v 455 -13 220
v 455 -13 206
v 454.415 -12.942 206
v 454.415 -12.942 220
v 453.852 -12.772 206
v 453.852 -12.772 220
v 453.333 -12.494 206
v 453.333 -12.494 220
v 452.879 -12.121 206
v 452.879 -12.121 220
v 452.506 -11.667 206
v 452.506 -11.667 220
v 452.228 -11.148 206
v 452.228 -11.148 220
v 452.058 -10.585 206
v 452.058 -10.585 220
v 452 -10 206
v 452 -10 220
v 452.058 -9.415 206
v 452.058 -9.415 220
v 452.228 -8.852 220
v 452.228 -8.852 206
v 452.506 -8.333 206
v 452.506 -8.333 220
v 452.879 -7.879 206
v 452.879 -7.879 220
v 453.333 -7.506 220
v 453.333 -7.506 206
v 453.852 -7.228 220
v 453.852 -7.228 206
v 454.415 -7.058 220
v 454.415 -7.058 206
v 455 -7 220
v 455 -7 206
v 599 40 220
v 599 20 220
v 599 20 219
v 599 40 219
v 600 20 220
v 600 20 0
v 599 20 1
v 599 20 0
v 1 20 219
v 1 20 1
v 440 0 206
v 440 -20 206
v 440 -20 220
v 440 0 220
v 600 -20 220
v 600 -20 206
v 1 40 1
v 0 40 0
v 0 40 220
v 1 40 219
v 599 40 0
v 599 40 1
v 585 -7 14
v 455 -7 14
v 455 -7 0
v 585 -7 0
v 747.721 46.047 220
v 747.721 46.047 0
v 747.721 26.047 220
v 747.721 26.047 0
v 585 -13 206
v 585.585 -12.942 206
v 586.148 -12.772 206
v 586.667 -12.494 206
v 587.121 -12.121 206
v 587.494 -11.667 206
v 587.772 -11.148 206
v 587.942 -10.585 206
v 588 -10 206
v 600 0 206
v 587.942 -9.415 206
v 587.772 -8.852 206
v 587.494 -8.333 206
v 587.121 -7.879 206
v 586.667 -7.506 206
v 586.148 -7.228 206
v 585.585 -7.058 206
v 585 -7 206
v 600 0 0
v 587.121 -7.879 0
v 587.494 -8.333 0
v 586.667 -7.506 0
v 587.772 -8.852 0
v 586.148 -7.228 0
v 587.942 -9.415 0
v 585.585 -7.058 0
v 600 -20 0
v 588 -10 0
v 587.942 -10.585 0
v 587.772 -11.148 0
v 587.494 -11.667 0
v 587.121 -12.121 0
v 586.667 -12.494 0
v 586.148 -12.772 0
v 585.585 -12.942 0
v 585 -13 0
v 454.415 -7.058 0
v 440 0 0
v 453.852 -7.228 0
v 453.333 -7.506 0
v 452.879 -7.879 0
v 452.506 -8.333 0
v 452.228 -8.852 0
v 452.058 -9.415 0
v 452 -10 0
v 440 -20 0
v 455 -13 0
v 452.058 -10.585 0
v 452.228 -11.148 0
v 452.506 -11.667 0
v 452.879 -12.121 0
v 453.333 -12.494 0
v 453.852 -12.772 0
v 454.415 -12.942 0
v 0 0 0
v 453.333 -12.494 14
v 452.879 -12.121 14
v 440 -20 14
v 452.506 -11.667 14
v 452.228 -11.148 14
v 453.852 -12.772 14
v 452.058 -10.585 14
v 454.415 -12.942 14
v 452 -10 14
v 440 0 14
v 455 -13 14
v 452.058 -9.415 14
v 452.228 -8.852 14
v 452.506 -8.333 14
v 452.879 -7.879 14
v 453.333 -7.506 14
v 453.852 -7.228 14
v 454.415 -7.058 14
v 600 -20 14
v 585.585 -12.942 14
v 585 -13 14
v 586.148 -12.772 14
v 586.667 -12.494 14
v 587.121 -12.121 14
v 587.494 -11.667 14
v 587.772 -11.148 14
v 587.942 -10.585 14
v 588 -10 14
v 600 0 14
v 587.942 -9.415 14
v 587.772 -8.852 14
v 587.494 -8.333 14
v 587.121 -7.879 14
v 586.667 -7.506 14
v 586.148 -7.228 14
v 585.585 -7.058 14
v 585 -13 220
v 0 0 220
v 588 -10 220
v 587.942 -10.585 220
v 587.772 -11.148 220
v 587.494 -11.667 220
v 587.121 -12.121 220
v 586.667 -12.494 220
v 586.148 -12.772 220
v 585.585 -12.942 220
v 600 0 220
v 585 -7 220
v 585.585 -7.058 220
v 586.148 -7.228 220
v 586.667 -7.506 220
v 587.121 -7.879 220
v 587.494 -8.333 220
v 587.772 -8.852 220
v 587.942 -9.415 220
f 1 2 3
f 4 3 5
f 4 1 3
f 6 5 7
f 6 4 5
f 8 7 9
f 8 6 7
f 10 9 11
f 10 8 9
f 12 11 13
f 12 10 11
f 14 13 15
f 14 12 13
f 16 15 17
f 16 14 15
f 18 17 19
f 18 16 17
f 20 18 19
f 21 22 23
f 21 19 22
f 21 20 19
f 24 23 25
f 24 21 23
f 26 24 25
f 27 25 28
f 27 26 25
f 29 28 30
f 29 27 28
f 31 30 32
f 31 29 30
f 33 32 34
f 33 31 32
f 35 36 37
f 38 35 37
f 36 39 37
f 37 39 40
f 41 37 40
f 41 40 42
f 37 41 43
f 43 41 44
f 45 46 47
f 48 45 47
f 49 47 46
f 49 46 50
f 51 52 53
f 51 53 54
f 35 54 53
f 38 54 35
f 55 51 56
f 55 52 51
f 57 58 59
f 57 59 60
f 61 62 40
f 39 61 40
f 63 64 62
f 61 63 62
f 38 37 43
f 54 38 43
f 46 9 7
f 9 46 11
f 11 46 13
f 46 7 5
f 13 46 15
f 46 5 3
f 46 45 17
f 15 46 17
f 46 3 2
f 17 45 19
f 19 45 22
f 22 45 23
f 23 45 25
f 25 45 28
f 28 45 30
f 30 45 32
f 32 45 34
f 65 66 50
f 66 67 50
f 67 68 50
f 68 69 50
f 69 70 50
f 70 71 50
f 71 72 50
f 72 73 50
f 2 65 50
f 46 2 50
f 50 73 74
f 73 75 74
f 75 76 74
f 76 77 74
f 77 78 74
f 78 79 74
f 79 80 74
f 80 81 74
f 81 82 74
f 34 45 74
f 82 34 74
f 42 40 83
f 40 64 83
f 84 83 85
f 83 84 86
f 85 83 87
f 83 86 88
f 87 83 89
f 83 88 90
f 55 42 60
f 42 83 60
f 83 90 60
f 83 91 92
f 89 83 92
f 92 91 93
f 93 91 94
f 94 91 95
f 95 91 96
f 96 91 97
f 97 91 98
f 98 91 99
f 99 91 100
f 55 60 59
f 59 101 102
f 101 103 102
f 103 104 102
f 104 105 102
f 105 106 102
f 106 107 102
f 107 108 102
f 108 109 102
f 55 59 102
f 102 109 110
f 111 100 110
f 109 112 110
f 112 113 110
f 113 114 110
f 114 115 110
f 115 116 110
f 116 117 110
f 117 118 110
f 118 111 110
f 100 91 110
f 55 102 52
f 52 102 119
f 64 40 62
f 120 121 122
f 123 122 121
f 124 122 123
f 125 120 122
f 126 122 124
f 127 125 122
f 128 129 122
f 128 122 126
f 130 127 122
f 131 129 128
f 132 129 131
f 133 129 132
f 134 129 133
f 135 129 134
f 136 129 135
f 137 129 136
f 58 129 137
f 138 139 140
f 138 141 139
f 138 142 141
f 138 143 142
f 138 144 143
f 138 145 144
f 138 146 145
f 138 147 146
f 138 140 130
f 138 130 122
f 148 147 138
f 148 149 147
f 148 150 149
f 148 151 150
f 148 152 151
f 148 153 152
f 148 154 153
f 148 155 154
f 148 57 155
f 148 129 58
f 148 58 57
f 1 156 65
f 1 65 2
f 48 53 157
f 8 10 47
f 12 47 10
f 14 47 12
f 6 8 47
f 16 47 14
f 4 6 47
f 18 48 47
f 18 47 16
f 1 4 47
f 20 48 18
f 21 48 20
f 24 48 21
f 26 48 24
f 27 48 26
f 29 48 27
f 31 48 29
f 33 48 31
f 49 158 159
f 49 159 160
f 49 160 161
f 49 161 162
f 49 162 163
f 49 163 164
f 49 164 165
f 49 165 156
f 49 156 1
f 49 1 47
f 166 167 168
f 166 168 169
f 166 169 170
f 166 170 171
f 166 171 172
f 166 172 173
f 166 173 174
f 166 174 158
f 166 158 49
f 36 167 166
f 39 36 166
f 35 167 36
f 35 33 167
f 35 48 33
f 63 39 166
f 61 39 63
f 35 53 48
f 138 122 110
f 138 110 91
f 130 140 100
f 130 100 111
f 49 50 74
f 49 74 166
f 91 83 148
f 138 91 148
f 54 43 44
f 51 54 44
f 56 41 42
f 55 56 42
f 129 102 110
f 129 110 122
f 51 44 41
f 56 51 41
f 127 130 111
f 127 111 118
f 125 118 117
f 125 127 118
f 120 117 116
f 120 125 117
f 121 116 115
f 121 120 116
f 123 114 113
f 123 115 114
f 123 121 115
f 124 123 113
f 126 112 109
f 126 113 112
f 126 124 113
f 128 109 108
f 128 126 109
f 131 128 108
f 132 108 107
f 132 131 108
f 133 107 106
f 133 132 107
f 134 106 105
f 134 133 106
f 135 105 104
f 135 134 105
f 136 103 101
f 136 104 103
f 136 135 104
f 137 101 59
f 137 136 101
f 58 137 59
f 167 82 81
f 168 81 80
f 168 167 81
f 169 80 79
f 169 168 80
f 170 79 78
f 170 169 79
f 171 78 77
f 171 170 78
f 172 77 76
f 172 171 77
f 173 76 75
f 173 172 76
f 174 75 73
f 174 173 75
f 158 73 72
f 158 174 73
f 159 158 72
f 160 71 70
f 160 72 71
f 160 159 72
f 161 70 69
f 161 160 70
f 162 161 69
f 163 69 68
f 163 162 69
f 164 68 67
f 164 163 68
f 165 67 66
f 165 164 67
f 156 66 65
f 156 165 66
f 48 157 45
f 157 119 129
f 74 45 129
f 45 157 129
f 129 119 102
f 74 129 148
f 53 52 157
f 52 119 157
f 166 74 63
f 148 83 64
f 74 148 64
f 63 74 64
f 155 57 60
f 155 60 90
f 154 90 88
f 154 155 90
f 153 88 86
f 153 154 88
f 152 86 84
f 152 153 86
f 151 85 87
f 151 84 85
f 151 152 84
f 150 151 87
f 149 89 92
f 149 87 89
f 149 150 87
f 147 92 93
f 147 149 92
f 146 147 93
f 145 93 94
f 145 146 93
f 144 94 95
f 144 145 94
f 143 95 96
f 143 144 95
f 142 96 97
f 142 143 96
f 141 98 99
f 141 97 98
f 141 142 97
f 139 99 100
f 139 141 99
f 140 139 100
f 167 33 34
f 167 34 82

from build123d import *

# Parameters (mm, degrees)
DODANIE_WYCI_GNI_CIE1_DEPTH = 220
DODANIE_WYCI_GNI_CIE2_DEPTH = 20
SZKIC3_W                    = 160
SZKIC3_H                    = 14
DODANIE_WYCI_GNI_CIE3_DEPTH = 20
WYTNIJ_WYCI_GNI_CIE1_DEPTH  = 781.773516846


with BuildPart() as part:
    # Szkic1 → Dodanie-wyciągnięcie1 (new body)
    with BuildSketch(Plane.XY):
        Polygon((600, 0), (747.721162952, 26.04722665), (747.721162952, 46.04722665), (600, 20), (0, 20), (0, 0), align=None)
    extrude(amount=DODANIE_WYCI_GNI_CIE1_DEPTH)

    # Szkic2 → Dodanie-wyciągnięcie2 (add)
    with BuildSketch(Plane(origin=(0, 20, 0), x_dir=(1, 0, 0), z_dir=(0, 1, 0))):
        Polygon((1, -1), (599, -1), (599, 0), (0, 0), (0, -220), (599, -220), (599, -219), (1, -219), align=None)
    extrude(amount=DODANIE_WYCI_GNI_CIE2_DEPTH)

    # Szkic3 → Dodanie-wyciągnięcie3 (add)
    with BuildSketch(Plane.XZ):
        with Locations((520, 213)):
            Rectangle(SZKIC3_W, SZKIC3_H)
        with Locations((520, 7)):
            Rectangle(SZKIC3_W, SZKIC3_H)
    extrude(amount=DODANIE_WYCI_GNI_CIE3_DEPTH)

    # Szkic4 → Wytnij-wyciągnięcie1 (cut, through all)
    with BuildSketch(Plane.XY.offset(220)):
        with BuildLine():
            Line((585, -13), (455, -13))
            ThreePointArc((455, -13), (452, -10), (455, -7))
            Line((455, -7), (585, -7))
            ThreePointArc((585, -7), (588, -10), (585, -13))
        make_face()
    extrude(amount=-WYTNIJ_WYCI_GNI_CIE1_DEPTH, mode=Mode.SUBTRACT)


solid = part.part
